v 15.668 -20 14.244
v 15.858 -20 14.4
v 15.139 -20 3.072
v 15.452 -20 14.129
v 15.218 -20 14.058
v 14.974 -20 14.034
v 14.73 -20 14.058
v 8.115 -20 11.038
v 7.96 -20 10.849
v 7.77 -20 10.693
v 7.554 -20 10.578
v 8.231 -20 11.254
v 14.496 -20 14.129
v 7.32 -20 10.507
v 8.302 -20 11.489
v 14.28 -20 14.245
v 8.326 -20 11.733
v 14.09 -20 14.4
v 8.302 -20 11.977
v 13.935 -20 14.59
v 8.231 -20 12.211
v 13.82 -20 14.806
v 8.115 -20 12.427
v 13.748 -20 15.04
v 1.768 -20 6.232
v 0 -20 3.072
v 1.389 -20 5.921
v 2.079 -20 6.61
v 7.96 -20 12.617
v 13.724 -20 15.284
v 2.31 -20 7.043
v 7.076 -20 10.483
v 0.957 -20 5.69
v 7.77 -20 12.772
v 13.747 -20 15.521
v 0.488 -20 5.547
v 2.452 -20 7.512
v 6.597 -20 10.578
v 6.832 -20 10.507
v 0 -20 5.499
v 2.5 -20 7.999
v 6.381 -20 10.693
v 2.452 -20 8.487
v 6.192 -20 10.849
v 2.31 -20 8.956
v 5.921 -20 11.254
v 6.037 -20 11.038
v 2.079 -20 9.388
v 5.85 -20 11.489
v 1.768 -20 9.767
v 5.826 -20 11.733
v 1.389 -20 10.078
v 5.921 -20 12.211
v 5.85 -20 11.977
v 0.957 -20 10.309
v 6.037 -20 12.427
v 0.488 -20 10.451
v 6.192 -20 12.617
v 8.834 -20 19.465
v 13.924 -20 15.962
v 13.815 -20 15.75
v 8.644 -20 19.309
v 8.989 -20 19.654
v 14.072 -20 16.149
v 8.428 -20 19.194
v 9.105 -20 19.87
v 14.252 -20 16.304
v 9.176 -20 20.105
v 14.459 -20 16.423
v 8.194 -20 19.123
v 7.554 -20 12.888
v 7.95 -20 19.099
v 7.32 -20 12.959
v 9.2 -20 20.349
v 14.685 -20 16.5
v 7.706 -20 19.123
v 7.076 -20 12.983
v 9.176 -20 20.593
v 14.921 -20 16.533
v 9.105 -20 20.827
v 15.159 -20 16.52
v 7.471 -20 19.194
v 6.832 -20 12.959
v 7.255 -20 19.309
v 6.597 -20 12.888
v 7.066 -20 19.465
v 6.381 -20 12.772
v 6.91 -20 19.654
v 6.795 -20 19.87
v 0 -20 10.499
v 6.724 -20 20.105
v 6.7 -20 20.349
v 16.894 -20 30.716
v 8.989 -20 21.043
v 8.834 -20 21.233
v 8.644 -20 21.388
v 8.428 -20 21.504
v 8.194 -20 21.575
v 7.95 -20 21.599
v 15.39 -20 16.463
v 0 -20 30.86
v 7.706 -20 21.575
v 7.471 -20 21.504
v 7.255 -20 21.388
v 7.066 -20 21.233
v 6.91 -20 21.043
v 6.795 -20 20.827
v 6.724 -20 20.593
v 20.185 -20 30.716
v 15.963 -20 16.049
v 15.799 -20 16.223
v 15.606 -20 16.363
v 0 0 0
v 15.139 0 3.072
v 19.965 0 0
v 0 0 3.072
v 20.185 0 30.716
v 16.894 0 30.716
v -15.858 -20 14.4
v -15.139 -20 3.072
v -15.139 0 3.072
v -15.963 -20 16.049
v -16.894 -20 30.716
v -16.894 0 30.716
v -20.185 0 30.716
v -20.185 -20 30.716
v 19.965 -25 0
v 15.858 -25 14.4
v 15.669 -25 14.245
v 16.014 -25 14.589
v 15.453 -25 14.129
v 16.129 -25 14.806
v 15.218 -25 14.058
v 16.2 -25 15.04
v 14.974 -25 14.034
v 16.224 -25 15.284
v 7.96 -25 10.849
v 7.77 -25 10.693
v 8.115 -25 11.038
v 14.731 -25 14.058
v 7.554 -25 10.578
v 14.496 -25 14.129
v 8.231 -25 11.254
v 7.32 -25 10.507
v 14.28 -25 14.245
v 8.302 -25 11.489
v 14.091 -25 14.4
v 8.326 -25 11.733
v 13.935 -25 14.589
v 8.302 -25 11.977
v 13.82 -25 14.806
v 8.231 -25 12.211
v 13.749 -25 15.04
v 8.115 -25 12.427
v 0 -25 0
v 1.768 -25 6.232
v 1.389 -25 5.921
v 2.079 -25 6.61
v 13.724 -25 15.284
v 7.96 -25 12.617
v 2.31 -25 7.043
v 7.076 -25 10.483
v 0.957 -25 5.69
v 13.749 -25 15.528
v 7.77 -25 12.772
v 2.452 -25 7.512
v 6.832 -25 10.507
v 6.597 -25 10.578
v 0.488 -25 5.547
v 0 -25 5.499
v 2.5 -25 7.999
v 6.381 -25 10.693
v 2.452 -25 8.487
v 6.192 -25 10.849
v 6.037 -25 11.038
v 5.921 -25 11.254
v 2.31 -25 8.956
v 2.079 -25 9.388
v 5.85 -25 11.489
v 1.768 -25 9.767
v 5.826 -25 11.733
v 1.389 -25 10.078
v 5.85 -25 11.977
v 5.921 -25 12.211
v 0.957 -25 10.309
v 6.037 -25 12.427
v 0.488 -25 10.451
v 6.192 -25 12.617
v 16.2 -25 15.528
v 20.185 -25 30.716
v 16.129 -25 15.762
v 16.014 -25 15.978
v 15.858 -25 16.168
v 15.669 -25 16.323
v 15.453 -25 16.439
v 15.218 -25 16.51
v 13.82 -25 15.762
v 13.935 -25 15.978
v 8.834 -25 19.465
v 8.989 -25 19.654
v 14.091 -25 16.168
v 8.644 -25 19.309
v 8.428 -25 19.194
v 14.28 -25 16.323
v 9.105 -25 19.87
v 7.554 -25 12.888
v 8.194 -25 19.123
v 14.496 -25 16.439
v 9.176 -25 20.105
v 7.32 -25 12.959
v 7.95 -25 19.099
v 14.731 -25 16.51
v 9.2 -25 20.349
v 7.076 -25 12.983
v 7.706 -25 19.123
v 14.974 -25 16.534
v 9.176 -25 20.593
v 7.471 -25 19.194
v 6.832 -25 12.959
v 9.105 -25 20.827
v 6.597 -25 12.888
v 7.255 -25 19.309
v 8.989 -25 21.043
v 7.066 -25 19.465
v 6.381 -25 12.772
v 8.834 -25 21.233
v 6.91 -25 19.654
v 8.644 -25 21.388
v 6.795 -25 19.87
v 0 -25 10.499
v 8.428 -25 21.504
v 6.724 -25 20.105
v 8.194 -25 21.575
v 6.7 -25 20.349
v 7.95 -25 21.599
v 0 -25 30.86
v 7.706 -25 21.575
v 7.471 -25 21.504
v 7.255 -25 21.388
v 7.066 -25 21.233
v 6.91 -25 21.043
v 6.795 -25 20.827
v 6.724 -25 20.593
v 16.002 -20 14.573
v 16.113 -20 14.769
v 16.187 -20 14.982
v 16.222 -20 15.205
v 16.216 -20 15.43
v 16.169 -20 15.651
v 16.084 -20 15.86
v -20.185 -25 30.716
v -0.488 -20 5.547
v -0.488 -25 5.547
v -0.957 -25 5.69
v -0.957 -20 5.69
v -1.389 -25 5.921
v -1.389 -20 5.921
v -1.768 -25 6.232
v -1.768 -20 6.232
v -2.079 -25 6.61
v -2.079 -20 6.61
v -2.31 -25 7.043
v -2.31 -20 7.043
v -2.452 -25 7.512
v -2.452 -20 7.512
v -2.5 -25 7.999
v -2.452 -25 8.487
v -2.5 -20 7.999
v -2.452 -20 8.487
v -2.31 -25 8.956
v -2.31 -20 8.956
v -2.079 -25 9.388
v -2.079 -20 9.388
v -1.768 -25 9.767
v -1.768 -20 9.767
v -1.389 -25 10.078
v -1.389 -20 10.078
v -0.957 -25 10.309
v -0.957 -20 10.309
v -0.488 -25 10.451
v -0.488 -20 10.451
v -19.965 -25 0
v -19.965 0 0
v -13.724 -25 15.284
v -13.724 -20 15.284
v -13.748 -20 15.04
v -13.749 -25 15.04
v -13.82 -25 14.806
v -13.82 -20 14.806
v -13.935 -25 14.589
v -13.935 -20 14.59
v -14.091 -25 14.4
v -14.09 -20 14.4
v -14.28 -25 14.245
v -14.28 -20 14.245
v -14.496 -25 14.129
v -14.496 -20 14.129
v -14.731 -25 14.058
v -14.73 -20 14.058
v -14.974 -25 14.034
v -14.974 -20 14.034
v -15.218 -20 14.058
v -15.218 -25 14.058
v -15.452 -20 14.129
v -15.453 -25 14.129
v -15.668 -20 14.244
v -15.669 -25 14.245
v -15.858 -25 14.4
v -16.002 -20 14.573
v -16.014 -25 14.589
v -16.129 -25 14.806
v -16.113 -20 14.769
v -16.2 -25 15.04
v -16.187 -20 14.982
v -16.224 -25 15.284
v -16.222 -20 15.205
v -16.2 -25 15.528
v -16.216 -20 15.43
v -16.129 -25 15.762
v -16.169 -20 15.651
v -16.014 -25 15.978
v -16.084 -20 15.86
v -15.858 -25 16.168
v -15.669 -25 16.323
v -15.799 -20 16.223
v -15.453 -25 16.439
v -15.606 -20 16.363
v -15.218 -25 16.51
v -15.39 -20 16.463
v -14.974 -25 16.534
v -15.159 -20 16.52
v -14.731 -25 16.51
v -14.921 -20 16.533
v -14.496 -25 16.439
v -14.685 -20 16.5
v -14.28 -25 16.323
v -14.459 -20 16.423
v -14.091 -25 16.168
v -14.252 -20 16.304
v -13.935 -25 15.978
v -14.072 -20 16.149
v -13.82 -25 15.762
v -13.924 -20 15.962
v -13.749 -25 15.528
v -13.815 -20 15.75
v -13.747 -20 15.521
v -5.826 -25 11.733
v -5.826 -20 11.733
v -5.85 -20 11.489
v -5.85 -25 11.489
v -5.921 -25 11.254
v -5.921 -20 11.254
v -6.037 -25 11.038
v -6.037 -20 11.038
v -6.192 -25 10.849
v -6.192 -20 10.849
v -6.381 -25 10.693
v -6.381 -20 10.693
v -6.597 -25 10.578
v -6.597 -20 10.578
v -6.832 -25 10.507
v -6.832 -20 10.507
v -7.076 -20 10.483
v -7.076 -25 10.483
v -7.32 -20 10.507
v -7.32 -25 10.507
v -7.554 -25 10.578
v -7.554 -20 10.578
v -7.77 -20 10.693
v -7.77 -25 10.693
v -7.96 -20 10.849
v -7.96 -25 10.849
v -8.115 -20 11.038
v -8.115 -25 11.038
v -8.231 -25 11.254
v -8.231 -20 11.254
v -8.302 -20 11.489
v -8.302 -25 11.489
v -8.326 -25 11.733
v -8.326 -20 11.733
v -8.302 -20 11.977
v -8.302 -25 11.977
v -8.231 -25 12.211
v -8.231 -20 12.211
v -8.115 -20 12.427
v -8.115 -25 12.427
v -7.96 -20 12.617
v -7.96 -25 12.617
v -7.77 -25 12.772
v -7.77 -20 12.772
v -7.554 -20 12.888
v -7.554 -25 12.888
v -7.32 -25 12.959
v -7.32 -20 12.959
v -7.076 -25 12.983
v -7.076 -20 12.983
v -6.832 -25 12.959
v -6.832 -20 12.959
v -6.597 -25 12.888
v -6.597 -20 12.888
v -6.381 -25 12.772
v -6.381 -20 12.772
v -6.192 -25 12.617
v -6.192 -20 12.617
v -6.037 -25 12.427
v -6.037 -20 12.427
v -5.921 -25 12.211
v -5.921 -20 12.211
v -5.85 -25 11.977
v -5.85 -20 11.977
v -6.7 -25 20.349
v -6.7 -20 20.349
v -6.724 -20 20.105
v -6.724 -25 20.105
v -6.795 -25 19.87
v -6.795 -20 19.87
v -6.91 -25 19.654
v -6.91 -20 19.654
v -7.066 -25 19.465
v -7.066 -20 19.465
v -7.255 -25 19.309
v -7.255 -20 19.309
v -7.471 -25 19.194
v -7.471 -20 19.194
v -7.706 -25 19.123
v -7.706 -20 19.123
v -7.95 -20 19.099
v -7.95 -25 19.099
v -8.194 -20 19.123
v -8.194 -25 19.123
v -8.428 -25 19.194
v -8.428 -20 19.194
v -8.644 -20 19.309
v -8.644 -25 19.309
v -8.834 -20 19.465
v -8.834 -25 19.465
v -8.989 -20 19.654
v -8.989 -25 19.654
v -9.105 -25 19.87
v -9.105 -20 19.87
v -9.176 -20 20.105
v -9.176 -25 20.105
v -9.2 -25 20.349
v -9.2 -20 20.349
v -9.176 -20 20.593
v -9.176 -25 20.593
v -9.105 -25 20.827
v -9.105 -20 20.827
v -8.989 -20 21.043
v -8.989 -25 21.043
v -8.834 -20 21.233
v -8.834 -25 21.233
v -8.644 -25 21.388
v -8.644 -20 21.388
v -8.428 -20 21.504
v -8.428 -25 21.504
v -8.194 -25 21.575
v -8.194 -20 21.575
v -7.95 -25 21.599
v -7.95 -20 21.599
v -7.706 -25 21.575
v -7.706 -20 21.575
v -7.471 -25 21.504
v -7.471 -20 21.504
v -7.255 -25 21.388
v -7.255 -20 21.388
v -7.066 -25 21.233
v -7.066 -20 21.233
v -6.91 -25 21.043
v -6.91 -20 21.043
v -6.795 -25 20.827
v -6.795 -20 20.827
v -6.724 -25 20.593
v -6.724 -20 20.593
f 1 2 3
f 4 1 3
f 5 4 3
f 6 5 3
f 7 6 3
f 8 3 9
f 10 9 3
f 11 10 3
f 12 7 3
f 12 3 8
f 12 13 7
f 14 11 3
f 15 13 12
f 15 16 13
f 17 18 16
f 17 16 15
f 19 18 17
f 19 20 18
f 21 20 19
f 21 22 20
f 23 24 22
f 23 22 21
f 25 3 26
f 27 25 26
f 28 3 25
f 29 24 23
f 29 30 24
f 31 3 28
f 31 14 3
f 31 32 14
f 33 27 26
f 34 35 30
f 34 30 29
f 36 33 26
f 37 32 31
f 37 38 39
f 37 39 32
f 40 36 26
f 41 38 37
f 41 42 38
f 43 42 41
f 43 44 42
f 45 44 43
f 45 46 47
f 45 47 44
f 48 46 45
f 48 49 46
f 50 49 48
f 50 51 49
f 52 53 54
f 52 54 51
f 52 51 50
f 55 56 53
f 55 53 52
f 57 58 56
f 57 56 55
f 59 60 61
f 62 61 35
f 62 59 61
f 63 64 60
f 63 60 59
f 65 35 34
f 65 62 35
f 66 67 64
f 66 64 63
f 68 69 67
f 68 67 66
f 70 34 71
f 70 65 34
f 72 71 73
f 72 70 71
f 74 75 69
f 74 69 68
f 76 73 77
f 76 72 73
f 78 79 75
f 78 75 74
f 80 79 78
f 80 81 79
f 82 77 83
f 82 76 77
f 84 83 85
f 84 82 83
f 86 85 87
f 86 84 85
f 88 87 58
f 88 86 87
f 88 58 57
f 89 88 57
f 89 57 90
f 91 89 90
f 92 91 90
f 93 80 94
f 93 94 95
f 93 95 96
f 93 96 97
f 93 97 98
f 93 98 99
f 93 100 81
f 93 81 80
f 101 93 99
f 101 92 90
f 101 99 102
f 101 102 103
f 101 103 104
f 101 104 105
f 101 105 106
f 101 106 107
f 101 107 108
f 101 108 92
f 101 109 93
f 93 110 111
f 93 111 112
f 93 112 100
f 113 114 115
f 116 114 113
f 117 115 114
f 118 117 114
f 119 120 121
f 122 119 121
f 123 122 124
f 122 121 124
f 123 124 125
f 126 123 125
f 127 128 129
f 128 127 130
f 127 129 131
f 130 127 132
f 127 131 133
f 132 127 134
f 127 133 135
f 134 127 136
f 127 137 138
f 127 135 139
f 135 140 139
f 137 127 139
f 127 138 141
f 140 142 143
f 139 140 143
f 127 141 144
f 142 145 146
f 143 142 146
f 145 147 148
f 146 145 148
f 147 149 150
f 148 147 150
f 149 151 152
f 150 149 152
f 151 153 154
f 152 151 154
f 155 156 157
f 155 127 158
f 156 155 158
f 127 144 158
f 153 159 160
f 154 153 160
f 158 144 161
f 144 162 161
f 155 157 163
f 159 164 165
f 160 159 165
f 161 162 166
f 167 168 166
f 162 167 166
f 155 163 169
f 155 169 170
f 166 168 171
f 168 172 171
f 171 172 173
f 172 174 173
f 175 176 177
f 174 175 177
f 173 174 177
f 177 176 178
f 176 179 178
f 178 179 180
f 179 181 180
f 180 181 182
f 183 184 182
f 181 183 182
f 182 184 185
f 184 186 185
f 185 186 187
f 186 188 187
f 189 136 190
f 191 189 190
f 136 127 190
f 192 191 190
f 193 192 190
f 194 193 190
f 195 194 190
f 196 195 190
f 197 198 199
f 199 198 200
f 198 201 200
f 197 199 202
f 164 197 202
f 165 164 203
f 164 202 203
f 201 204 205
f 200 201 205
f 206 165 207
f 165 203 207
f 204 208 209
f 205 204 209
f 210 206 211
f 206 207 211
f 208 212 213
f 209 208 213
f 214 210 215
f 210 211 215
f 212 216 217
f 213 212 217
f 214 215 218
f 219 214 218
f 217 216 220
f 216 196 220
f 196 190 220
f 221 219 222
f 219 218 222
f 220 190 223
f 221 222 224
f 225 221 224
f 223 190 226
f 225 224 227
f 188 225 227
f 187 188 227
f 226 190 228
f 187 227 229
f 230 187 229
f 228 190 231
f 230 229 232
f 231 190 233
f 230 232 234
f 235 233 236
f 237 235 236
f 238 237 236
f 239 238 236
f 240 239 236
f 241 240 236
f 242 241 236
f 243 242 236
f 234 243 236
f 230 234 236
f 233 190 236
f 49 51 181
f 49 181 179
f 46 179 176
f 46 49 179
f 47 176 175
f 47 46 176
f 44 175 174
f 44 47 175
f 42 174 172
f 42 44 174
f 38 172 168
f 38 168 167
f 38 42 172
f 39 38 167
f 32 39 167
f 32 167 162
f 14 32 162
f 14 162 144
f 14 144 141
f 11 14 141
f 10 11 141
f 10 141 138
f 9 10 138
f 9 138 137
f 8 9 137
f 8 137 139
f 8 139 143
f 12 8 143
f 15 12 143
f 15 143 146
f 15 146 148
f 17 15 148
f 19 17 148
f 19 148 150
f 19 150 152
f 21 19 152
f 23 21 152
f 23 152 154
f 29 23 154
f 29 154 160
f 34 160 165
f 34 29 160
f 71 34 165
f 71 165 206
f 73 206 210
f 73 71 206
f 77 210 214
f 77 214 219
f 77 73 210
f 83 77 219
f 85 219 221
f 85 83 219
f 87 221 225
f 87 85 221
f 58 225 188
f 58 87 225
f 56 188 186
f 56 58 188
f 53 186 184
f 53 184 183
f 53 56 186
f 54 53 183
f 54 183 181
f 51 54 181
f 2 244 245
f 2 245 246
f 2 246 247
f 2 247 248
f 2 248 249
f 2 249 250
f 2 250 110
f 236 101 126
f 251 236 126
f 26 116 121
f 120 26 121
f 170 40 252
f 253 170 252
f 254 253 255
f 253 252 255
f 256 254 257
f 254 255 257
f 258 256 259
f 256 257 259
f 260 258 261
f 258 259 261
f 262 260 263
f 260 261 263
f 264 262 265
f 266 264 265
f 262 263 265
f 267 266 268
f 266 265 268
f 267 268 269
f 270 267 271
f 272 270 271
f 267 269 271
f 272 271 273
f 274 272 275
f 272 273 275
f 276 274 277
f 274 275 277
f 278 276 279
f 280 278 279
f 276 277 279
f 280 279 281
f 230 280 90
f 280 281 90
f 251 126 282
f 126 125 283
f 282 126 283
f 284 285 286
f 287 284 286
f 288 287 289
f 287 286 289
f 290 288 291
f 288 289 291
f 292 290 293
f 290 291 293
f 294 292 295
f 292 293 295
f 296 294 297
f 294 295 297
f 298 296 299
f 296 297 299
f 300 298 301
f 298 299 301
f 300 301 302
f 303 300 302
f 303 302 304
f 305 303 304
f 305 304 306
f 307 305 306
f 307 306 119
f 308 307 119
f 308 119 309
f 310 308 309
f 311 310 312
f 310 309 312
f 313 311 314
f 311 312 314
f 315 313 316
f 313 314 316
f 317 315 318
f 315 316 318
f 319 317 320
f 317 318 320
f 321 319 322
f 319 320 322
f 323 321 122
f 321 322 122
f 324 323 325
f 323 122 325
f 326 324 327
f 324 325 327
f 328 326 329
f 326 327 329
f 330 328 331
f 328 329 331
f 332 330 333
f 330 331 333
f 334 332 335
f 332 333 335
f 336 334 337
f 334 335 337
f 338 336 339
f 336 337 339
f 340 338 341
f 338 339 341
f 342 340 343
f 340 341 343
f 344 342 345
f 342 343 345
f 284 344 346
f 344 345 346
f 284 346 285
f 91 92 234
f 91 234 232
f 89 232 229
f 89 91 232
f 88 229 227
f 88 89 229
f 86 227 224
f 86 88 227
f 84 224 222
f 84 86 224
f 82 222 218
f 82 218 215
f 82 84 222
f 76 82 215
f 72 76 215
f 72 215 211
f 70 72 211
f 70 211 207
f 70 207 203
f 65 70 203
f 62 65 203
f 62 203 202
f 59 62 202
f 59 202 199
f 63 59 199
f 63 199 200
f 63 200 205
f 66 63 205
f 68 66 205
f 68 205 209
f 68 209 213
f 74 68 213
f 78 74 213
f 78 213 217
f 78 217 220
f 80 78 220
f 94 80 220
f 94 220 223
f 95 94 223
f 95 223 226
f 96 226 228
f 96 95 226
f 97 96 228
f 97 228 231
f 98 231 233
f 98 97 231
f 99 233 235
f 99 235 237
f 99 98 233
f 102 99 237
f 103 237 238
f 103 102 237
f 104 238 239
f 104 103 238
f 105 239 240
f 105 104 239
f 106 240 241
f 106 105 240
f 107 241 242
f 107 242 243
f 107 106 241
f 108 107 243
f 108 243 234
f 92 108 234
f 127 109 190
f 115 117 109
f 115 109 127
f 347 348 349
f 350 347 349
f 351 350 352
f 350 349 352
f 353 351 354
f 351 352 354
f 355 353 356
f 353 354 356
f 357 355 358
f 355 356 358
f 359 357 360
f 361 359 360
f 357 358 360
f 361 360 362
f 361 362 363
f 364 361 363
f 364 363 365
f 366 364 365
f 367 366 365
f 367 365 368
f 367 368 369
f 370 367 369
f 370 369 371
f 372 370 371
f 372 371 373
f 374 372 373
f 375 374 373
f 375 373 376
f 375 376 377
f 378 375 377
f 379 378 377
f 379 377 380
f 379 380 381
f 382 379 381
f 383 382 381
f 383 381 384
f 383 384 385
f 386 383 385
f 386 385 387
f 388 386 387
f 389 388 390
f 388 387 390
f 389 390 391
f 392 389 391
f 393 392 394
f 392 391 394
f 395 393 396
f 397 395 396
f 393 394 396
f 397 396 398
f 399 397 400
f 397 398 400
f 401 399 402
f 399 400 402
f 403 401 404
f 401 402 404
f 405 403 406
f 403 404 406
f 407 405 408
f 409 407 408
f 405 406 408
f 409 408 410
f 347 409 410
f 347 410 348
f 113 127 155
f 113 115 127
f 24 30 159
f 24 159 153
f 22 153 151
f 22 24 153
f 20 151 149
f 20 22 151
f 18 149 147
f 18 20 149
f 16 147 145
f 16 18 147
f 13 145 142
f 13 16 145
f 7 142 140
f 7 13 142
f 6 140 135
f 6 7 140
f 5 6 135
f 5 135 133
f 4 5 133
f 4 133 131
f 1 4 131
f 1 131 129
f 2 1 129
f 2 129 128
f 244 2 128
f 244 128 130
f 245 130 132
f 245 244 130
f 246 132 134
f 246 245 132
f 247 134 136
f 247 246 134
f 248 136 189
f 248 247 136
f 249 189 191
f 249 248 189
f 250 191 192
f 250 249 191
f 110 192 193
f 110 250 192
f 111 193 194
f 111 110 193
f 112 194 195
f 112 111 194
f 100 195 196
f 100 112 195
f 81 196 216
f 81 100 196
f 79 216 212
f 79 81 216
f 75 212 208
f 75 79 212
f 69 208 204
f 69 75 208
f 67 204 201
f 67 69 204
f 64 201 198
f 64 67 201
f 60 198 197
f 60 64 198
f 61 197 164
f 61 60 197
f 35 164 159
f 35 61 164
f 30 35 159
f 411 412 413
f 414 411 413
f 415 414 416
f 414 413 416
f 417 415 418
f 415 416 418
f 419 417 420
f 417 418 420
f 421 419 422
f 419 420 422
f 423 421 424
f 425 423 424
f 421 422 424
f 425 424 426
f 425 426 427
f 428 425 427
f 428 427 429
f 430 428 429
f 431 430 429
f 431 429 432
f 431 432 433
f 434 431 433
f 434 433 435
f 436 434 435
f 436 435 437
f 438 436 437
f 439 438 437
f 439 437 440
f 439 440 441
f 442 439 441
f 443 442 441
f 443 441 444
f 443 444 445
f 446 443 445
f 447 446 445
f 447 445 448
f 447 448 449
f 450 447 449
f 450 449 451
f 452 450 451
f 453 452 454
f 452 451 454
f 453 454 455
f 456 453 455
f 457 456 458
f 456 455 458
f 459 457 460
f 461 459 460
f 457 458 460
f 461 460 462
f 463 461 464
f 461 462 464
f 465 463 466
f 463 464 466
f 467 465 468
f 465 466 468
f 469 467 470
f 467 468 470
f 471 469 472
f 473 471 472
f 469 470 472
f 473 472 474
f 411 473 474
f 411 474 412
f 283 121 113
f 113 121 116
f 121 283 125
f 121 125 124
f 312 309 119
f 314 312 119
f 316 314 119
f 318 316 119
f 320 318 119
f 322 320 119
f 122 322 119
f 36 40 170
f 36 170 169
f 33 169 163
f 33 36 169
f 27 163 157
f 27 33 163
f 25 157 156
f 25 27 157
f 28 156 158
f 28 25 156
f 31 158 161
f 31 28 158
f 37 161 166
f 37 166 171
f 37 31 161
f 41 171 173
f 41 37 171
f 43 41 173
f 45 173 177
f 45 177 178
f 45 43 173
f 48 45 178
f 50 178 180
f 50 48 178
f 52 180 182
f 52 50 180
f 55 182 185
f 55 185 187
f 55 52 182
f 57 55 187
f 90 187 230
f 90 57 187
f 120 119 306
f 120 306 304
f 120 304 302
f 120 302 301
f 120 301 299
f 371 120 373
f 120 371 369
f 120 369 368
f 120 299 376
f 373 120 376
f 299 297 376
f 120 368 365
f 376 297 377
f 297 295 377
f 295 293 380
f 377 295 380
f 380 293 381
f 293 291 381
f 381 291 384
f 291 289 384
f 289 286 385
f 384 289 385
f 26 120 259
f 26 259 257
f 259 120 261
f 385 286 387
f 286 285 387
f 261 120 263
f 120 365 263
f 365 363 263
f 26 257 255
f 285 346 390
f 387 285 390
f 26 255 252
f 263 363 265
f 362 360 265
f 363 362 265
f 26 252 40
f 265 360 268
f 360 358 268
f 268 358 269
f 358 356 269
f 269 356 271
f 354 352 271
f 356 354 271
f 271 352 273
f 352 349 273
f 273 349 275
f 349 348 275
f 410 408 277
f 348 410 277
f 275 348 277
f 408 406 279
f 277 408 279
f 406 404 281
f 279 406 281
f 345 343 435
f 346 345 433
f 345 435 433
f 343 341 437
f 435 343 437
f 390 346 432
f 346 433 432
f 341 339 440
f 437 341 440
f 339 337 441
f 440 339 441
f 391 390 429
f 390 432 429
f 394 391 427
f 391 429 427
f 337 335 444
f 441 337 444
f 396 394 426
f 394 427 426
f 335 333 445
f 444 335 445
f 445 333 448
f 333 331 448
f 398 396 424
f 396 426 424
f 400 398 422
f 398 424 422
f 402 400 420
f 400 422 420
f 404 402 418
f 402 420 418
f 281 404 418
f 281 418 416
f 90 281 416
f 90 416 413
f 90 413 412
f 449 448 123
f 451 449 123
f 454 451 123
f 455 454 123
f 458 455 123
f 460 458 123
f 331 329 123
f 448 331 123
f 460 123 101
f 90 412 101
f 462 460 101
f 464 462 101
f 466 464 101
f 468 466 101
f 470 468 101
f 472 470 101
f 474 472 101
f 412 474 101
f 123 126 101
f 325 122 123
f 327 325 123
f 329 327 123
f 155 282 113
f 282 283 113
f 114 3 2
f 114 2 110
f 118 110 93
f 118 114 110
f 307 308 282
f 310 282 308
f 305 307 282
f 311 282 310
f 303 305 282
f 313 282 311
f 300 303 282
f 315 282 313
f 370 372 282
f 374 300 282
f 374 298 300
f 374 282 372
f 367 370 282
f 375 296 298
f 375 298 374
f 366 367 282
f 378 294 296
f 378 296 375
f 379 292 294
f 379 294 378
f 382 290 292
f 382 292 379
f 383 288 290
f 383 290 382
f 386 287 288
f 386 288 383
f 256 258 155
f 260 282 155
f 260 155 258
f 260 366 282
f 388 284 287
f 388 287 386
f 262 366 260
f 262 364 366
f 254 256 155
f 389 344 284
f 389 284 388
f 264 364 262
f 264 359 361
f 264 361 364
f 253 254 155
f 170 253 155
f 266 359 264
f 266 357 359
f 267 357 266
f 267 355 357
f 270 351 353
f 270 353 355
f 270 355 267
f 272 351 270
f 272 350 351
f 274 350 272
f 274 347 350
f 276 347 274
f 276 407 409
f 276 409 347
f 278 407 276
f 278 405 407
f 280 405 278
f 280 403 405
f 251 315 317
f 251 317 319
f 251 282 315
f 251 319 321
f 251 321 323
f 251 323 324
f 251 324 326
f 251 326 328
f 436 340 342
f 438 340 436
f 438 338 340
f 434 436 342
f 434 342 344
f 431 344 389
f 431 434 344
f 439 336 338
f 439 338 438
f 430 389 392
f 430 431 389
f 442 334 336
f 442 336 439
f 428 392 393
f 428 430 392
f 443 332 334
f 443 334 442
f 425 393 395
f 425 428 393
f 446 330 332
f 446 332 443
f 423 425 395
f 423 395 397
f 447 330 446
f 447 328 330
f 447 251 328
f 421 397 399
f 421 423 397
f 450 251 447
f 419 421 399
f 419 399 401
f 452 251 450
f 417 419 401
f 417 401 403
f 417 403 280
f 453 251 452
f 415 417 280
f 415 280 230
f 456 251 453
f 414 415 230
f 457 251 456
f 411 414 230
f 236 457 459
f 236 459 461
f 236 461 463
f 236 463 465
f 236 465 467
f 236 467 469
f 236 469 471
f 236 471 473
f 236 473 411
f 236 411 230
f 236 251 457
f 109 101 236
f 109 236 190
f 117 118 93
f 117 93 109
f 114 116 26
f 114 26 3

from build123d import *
from build123d import SkipClean  # not in build123d's __all__

# Parameters (mm, degrees)
F1_DEPTH = 20
F3_DEPTH = 5
F4_D     = 2.5
F4_DEPTH = 5.001


with BuildPart() as f1:
    # F0 (on Front) → F1 (new body)
    with BuildSketch(Plane.XZ):
        Polygon((-19.9654586613, 0), (0, 0), (0, 3.0716089532), (-15.1386437938, 3.0716089532), (-16.8938487768, 30.7160895318), (-20.1848596334, 30.7160895318), align=None)
    extrude(amount=F1_DEPTH)

    # F2 (on face) → F3 (join)
    with BuildSketch(Plane.XZ.offset(20)):
        with BuildLine():
            Line((0, 30.8602673192), (-20.1848596334, 30.7160895318))
            Line((-20.1848596334, 30.7160895318), (-16.8938487768, 30.7160895318))
            Line((-16.8938487768, 30.7160895318), (-15.1386437938, 3.0716089532))
            Line((-15.1386437938, 3.0716089532), (0, 3.0716089532))
            Line((0, 3.0716089532), (0, 5.4992720857))
            ThreePointArc((0, 5.4992720857), (-2.5, 7.9992720857), (0, 10.4992720857))
            Line((0, 10.4992720857), (0, 30.8602673192))
        make_face()
        Polygon((-16.8938487768, 30.7160895318), (-20.1848596334, 30.7160895318), (-19.9654586613, 0), (0, 0), (0, 3.0716089532), (-15.1386437938, 3.0716089532), align=None)
    extrude(amount=F3_DEPTH)

    # F4 (through all, one way)
    with BuildSketch(Plane(origin=(0, -20, 0), x_dir=(1, 0, 0), z_dir=(0, 1, 0))):
        with Locations((-14.9744828703, -15.2839560666), (-7.0758488149, -11.7326774155), (-7.9496683148, -20.3487344883)):
            Circle(F4_D / 2)
    extrude(amount=-F4_DEPTH, mode=Mode.SUBTRACT)

    # F5: F1 across plane


with BuildPart() as f1_1:
    add(f1.part, clean=False)
    with SkipClean():  # cleaning this boolean's faces spoils the solid; the shape is the same uncleaned
        add(f1.part.mirror(Plane.YZ), clean=False)


solid = f1_1.part
